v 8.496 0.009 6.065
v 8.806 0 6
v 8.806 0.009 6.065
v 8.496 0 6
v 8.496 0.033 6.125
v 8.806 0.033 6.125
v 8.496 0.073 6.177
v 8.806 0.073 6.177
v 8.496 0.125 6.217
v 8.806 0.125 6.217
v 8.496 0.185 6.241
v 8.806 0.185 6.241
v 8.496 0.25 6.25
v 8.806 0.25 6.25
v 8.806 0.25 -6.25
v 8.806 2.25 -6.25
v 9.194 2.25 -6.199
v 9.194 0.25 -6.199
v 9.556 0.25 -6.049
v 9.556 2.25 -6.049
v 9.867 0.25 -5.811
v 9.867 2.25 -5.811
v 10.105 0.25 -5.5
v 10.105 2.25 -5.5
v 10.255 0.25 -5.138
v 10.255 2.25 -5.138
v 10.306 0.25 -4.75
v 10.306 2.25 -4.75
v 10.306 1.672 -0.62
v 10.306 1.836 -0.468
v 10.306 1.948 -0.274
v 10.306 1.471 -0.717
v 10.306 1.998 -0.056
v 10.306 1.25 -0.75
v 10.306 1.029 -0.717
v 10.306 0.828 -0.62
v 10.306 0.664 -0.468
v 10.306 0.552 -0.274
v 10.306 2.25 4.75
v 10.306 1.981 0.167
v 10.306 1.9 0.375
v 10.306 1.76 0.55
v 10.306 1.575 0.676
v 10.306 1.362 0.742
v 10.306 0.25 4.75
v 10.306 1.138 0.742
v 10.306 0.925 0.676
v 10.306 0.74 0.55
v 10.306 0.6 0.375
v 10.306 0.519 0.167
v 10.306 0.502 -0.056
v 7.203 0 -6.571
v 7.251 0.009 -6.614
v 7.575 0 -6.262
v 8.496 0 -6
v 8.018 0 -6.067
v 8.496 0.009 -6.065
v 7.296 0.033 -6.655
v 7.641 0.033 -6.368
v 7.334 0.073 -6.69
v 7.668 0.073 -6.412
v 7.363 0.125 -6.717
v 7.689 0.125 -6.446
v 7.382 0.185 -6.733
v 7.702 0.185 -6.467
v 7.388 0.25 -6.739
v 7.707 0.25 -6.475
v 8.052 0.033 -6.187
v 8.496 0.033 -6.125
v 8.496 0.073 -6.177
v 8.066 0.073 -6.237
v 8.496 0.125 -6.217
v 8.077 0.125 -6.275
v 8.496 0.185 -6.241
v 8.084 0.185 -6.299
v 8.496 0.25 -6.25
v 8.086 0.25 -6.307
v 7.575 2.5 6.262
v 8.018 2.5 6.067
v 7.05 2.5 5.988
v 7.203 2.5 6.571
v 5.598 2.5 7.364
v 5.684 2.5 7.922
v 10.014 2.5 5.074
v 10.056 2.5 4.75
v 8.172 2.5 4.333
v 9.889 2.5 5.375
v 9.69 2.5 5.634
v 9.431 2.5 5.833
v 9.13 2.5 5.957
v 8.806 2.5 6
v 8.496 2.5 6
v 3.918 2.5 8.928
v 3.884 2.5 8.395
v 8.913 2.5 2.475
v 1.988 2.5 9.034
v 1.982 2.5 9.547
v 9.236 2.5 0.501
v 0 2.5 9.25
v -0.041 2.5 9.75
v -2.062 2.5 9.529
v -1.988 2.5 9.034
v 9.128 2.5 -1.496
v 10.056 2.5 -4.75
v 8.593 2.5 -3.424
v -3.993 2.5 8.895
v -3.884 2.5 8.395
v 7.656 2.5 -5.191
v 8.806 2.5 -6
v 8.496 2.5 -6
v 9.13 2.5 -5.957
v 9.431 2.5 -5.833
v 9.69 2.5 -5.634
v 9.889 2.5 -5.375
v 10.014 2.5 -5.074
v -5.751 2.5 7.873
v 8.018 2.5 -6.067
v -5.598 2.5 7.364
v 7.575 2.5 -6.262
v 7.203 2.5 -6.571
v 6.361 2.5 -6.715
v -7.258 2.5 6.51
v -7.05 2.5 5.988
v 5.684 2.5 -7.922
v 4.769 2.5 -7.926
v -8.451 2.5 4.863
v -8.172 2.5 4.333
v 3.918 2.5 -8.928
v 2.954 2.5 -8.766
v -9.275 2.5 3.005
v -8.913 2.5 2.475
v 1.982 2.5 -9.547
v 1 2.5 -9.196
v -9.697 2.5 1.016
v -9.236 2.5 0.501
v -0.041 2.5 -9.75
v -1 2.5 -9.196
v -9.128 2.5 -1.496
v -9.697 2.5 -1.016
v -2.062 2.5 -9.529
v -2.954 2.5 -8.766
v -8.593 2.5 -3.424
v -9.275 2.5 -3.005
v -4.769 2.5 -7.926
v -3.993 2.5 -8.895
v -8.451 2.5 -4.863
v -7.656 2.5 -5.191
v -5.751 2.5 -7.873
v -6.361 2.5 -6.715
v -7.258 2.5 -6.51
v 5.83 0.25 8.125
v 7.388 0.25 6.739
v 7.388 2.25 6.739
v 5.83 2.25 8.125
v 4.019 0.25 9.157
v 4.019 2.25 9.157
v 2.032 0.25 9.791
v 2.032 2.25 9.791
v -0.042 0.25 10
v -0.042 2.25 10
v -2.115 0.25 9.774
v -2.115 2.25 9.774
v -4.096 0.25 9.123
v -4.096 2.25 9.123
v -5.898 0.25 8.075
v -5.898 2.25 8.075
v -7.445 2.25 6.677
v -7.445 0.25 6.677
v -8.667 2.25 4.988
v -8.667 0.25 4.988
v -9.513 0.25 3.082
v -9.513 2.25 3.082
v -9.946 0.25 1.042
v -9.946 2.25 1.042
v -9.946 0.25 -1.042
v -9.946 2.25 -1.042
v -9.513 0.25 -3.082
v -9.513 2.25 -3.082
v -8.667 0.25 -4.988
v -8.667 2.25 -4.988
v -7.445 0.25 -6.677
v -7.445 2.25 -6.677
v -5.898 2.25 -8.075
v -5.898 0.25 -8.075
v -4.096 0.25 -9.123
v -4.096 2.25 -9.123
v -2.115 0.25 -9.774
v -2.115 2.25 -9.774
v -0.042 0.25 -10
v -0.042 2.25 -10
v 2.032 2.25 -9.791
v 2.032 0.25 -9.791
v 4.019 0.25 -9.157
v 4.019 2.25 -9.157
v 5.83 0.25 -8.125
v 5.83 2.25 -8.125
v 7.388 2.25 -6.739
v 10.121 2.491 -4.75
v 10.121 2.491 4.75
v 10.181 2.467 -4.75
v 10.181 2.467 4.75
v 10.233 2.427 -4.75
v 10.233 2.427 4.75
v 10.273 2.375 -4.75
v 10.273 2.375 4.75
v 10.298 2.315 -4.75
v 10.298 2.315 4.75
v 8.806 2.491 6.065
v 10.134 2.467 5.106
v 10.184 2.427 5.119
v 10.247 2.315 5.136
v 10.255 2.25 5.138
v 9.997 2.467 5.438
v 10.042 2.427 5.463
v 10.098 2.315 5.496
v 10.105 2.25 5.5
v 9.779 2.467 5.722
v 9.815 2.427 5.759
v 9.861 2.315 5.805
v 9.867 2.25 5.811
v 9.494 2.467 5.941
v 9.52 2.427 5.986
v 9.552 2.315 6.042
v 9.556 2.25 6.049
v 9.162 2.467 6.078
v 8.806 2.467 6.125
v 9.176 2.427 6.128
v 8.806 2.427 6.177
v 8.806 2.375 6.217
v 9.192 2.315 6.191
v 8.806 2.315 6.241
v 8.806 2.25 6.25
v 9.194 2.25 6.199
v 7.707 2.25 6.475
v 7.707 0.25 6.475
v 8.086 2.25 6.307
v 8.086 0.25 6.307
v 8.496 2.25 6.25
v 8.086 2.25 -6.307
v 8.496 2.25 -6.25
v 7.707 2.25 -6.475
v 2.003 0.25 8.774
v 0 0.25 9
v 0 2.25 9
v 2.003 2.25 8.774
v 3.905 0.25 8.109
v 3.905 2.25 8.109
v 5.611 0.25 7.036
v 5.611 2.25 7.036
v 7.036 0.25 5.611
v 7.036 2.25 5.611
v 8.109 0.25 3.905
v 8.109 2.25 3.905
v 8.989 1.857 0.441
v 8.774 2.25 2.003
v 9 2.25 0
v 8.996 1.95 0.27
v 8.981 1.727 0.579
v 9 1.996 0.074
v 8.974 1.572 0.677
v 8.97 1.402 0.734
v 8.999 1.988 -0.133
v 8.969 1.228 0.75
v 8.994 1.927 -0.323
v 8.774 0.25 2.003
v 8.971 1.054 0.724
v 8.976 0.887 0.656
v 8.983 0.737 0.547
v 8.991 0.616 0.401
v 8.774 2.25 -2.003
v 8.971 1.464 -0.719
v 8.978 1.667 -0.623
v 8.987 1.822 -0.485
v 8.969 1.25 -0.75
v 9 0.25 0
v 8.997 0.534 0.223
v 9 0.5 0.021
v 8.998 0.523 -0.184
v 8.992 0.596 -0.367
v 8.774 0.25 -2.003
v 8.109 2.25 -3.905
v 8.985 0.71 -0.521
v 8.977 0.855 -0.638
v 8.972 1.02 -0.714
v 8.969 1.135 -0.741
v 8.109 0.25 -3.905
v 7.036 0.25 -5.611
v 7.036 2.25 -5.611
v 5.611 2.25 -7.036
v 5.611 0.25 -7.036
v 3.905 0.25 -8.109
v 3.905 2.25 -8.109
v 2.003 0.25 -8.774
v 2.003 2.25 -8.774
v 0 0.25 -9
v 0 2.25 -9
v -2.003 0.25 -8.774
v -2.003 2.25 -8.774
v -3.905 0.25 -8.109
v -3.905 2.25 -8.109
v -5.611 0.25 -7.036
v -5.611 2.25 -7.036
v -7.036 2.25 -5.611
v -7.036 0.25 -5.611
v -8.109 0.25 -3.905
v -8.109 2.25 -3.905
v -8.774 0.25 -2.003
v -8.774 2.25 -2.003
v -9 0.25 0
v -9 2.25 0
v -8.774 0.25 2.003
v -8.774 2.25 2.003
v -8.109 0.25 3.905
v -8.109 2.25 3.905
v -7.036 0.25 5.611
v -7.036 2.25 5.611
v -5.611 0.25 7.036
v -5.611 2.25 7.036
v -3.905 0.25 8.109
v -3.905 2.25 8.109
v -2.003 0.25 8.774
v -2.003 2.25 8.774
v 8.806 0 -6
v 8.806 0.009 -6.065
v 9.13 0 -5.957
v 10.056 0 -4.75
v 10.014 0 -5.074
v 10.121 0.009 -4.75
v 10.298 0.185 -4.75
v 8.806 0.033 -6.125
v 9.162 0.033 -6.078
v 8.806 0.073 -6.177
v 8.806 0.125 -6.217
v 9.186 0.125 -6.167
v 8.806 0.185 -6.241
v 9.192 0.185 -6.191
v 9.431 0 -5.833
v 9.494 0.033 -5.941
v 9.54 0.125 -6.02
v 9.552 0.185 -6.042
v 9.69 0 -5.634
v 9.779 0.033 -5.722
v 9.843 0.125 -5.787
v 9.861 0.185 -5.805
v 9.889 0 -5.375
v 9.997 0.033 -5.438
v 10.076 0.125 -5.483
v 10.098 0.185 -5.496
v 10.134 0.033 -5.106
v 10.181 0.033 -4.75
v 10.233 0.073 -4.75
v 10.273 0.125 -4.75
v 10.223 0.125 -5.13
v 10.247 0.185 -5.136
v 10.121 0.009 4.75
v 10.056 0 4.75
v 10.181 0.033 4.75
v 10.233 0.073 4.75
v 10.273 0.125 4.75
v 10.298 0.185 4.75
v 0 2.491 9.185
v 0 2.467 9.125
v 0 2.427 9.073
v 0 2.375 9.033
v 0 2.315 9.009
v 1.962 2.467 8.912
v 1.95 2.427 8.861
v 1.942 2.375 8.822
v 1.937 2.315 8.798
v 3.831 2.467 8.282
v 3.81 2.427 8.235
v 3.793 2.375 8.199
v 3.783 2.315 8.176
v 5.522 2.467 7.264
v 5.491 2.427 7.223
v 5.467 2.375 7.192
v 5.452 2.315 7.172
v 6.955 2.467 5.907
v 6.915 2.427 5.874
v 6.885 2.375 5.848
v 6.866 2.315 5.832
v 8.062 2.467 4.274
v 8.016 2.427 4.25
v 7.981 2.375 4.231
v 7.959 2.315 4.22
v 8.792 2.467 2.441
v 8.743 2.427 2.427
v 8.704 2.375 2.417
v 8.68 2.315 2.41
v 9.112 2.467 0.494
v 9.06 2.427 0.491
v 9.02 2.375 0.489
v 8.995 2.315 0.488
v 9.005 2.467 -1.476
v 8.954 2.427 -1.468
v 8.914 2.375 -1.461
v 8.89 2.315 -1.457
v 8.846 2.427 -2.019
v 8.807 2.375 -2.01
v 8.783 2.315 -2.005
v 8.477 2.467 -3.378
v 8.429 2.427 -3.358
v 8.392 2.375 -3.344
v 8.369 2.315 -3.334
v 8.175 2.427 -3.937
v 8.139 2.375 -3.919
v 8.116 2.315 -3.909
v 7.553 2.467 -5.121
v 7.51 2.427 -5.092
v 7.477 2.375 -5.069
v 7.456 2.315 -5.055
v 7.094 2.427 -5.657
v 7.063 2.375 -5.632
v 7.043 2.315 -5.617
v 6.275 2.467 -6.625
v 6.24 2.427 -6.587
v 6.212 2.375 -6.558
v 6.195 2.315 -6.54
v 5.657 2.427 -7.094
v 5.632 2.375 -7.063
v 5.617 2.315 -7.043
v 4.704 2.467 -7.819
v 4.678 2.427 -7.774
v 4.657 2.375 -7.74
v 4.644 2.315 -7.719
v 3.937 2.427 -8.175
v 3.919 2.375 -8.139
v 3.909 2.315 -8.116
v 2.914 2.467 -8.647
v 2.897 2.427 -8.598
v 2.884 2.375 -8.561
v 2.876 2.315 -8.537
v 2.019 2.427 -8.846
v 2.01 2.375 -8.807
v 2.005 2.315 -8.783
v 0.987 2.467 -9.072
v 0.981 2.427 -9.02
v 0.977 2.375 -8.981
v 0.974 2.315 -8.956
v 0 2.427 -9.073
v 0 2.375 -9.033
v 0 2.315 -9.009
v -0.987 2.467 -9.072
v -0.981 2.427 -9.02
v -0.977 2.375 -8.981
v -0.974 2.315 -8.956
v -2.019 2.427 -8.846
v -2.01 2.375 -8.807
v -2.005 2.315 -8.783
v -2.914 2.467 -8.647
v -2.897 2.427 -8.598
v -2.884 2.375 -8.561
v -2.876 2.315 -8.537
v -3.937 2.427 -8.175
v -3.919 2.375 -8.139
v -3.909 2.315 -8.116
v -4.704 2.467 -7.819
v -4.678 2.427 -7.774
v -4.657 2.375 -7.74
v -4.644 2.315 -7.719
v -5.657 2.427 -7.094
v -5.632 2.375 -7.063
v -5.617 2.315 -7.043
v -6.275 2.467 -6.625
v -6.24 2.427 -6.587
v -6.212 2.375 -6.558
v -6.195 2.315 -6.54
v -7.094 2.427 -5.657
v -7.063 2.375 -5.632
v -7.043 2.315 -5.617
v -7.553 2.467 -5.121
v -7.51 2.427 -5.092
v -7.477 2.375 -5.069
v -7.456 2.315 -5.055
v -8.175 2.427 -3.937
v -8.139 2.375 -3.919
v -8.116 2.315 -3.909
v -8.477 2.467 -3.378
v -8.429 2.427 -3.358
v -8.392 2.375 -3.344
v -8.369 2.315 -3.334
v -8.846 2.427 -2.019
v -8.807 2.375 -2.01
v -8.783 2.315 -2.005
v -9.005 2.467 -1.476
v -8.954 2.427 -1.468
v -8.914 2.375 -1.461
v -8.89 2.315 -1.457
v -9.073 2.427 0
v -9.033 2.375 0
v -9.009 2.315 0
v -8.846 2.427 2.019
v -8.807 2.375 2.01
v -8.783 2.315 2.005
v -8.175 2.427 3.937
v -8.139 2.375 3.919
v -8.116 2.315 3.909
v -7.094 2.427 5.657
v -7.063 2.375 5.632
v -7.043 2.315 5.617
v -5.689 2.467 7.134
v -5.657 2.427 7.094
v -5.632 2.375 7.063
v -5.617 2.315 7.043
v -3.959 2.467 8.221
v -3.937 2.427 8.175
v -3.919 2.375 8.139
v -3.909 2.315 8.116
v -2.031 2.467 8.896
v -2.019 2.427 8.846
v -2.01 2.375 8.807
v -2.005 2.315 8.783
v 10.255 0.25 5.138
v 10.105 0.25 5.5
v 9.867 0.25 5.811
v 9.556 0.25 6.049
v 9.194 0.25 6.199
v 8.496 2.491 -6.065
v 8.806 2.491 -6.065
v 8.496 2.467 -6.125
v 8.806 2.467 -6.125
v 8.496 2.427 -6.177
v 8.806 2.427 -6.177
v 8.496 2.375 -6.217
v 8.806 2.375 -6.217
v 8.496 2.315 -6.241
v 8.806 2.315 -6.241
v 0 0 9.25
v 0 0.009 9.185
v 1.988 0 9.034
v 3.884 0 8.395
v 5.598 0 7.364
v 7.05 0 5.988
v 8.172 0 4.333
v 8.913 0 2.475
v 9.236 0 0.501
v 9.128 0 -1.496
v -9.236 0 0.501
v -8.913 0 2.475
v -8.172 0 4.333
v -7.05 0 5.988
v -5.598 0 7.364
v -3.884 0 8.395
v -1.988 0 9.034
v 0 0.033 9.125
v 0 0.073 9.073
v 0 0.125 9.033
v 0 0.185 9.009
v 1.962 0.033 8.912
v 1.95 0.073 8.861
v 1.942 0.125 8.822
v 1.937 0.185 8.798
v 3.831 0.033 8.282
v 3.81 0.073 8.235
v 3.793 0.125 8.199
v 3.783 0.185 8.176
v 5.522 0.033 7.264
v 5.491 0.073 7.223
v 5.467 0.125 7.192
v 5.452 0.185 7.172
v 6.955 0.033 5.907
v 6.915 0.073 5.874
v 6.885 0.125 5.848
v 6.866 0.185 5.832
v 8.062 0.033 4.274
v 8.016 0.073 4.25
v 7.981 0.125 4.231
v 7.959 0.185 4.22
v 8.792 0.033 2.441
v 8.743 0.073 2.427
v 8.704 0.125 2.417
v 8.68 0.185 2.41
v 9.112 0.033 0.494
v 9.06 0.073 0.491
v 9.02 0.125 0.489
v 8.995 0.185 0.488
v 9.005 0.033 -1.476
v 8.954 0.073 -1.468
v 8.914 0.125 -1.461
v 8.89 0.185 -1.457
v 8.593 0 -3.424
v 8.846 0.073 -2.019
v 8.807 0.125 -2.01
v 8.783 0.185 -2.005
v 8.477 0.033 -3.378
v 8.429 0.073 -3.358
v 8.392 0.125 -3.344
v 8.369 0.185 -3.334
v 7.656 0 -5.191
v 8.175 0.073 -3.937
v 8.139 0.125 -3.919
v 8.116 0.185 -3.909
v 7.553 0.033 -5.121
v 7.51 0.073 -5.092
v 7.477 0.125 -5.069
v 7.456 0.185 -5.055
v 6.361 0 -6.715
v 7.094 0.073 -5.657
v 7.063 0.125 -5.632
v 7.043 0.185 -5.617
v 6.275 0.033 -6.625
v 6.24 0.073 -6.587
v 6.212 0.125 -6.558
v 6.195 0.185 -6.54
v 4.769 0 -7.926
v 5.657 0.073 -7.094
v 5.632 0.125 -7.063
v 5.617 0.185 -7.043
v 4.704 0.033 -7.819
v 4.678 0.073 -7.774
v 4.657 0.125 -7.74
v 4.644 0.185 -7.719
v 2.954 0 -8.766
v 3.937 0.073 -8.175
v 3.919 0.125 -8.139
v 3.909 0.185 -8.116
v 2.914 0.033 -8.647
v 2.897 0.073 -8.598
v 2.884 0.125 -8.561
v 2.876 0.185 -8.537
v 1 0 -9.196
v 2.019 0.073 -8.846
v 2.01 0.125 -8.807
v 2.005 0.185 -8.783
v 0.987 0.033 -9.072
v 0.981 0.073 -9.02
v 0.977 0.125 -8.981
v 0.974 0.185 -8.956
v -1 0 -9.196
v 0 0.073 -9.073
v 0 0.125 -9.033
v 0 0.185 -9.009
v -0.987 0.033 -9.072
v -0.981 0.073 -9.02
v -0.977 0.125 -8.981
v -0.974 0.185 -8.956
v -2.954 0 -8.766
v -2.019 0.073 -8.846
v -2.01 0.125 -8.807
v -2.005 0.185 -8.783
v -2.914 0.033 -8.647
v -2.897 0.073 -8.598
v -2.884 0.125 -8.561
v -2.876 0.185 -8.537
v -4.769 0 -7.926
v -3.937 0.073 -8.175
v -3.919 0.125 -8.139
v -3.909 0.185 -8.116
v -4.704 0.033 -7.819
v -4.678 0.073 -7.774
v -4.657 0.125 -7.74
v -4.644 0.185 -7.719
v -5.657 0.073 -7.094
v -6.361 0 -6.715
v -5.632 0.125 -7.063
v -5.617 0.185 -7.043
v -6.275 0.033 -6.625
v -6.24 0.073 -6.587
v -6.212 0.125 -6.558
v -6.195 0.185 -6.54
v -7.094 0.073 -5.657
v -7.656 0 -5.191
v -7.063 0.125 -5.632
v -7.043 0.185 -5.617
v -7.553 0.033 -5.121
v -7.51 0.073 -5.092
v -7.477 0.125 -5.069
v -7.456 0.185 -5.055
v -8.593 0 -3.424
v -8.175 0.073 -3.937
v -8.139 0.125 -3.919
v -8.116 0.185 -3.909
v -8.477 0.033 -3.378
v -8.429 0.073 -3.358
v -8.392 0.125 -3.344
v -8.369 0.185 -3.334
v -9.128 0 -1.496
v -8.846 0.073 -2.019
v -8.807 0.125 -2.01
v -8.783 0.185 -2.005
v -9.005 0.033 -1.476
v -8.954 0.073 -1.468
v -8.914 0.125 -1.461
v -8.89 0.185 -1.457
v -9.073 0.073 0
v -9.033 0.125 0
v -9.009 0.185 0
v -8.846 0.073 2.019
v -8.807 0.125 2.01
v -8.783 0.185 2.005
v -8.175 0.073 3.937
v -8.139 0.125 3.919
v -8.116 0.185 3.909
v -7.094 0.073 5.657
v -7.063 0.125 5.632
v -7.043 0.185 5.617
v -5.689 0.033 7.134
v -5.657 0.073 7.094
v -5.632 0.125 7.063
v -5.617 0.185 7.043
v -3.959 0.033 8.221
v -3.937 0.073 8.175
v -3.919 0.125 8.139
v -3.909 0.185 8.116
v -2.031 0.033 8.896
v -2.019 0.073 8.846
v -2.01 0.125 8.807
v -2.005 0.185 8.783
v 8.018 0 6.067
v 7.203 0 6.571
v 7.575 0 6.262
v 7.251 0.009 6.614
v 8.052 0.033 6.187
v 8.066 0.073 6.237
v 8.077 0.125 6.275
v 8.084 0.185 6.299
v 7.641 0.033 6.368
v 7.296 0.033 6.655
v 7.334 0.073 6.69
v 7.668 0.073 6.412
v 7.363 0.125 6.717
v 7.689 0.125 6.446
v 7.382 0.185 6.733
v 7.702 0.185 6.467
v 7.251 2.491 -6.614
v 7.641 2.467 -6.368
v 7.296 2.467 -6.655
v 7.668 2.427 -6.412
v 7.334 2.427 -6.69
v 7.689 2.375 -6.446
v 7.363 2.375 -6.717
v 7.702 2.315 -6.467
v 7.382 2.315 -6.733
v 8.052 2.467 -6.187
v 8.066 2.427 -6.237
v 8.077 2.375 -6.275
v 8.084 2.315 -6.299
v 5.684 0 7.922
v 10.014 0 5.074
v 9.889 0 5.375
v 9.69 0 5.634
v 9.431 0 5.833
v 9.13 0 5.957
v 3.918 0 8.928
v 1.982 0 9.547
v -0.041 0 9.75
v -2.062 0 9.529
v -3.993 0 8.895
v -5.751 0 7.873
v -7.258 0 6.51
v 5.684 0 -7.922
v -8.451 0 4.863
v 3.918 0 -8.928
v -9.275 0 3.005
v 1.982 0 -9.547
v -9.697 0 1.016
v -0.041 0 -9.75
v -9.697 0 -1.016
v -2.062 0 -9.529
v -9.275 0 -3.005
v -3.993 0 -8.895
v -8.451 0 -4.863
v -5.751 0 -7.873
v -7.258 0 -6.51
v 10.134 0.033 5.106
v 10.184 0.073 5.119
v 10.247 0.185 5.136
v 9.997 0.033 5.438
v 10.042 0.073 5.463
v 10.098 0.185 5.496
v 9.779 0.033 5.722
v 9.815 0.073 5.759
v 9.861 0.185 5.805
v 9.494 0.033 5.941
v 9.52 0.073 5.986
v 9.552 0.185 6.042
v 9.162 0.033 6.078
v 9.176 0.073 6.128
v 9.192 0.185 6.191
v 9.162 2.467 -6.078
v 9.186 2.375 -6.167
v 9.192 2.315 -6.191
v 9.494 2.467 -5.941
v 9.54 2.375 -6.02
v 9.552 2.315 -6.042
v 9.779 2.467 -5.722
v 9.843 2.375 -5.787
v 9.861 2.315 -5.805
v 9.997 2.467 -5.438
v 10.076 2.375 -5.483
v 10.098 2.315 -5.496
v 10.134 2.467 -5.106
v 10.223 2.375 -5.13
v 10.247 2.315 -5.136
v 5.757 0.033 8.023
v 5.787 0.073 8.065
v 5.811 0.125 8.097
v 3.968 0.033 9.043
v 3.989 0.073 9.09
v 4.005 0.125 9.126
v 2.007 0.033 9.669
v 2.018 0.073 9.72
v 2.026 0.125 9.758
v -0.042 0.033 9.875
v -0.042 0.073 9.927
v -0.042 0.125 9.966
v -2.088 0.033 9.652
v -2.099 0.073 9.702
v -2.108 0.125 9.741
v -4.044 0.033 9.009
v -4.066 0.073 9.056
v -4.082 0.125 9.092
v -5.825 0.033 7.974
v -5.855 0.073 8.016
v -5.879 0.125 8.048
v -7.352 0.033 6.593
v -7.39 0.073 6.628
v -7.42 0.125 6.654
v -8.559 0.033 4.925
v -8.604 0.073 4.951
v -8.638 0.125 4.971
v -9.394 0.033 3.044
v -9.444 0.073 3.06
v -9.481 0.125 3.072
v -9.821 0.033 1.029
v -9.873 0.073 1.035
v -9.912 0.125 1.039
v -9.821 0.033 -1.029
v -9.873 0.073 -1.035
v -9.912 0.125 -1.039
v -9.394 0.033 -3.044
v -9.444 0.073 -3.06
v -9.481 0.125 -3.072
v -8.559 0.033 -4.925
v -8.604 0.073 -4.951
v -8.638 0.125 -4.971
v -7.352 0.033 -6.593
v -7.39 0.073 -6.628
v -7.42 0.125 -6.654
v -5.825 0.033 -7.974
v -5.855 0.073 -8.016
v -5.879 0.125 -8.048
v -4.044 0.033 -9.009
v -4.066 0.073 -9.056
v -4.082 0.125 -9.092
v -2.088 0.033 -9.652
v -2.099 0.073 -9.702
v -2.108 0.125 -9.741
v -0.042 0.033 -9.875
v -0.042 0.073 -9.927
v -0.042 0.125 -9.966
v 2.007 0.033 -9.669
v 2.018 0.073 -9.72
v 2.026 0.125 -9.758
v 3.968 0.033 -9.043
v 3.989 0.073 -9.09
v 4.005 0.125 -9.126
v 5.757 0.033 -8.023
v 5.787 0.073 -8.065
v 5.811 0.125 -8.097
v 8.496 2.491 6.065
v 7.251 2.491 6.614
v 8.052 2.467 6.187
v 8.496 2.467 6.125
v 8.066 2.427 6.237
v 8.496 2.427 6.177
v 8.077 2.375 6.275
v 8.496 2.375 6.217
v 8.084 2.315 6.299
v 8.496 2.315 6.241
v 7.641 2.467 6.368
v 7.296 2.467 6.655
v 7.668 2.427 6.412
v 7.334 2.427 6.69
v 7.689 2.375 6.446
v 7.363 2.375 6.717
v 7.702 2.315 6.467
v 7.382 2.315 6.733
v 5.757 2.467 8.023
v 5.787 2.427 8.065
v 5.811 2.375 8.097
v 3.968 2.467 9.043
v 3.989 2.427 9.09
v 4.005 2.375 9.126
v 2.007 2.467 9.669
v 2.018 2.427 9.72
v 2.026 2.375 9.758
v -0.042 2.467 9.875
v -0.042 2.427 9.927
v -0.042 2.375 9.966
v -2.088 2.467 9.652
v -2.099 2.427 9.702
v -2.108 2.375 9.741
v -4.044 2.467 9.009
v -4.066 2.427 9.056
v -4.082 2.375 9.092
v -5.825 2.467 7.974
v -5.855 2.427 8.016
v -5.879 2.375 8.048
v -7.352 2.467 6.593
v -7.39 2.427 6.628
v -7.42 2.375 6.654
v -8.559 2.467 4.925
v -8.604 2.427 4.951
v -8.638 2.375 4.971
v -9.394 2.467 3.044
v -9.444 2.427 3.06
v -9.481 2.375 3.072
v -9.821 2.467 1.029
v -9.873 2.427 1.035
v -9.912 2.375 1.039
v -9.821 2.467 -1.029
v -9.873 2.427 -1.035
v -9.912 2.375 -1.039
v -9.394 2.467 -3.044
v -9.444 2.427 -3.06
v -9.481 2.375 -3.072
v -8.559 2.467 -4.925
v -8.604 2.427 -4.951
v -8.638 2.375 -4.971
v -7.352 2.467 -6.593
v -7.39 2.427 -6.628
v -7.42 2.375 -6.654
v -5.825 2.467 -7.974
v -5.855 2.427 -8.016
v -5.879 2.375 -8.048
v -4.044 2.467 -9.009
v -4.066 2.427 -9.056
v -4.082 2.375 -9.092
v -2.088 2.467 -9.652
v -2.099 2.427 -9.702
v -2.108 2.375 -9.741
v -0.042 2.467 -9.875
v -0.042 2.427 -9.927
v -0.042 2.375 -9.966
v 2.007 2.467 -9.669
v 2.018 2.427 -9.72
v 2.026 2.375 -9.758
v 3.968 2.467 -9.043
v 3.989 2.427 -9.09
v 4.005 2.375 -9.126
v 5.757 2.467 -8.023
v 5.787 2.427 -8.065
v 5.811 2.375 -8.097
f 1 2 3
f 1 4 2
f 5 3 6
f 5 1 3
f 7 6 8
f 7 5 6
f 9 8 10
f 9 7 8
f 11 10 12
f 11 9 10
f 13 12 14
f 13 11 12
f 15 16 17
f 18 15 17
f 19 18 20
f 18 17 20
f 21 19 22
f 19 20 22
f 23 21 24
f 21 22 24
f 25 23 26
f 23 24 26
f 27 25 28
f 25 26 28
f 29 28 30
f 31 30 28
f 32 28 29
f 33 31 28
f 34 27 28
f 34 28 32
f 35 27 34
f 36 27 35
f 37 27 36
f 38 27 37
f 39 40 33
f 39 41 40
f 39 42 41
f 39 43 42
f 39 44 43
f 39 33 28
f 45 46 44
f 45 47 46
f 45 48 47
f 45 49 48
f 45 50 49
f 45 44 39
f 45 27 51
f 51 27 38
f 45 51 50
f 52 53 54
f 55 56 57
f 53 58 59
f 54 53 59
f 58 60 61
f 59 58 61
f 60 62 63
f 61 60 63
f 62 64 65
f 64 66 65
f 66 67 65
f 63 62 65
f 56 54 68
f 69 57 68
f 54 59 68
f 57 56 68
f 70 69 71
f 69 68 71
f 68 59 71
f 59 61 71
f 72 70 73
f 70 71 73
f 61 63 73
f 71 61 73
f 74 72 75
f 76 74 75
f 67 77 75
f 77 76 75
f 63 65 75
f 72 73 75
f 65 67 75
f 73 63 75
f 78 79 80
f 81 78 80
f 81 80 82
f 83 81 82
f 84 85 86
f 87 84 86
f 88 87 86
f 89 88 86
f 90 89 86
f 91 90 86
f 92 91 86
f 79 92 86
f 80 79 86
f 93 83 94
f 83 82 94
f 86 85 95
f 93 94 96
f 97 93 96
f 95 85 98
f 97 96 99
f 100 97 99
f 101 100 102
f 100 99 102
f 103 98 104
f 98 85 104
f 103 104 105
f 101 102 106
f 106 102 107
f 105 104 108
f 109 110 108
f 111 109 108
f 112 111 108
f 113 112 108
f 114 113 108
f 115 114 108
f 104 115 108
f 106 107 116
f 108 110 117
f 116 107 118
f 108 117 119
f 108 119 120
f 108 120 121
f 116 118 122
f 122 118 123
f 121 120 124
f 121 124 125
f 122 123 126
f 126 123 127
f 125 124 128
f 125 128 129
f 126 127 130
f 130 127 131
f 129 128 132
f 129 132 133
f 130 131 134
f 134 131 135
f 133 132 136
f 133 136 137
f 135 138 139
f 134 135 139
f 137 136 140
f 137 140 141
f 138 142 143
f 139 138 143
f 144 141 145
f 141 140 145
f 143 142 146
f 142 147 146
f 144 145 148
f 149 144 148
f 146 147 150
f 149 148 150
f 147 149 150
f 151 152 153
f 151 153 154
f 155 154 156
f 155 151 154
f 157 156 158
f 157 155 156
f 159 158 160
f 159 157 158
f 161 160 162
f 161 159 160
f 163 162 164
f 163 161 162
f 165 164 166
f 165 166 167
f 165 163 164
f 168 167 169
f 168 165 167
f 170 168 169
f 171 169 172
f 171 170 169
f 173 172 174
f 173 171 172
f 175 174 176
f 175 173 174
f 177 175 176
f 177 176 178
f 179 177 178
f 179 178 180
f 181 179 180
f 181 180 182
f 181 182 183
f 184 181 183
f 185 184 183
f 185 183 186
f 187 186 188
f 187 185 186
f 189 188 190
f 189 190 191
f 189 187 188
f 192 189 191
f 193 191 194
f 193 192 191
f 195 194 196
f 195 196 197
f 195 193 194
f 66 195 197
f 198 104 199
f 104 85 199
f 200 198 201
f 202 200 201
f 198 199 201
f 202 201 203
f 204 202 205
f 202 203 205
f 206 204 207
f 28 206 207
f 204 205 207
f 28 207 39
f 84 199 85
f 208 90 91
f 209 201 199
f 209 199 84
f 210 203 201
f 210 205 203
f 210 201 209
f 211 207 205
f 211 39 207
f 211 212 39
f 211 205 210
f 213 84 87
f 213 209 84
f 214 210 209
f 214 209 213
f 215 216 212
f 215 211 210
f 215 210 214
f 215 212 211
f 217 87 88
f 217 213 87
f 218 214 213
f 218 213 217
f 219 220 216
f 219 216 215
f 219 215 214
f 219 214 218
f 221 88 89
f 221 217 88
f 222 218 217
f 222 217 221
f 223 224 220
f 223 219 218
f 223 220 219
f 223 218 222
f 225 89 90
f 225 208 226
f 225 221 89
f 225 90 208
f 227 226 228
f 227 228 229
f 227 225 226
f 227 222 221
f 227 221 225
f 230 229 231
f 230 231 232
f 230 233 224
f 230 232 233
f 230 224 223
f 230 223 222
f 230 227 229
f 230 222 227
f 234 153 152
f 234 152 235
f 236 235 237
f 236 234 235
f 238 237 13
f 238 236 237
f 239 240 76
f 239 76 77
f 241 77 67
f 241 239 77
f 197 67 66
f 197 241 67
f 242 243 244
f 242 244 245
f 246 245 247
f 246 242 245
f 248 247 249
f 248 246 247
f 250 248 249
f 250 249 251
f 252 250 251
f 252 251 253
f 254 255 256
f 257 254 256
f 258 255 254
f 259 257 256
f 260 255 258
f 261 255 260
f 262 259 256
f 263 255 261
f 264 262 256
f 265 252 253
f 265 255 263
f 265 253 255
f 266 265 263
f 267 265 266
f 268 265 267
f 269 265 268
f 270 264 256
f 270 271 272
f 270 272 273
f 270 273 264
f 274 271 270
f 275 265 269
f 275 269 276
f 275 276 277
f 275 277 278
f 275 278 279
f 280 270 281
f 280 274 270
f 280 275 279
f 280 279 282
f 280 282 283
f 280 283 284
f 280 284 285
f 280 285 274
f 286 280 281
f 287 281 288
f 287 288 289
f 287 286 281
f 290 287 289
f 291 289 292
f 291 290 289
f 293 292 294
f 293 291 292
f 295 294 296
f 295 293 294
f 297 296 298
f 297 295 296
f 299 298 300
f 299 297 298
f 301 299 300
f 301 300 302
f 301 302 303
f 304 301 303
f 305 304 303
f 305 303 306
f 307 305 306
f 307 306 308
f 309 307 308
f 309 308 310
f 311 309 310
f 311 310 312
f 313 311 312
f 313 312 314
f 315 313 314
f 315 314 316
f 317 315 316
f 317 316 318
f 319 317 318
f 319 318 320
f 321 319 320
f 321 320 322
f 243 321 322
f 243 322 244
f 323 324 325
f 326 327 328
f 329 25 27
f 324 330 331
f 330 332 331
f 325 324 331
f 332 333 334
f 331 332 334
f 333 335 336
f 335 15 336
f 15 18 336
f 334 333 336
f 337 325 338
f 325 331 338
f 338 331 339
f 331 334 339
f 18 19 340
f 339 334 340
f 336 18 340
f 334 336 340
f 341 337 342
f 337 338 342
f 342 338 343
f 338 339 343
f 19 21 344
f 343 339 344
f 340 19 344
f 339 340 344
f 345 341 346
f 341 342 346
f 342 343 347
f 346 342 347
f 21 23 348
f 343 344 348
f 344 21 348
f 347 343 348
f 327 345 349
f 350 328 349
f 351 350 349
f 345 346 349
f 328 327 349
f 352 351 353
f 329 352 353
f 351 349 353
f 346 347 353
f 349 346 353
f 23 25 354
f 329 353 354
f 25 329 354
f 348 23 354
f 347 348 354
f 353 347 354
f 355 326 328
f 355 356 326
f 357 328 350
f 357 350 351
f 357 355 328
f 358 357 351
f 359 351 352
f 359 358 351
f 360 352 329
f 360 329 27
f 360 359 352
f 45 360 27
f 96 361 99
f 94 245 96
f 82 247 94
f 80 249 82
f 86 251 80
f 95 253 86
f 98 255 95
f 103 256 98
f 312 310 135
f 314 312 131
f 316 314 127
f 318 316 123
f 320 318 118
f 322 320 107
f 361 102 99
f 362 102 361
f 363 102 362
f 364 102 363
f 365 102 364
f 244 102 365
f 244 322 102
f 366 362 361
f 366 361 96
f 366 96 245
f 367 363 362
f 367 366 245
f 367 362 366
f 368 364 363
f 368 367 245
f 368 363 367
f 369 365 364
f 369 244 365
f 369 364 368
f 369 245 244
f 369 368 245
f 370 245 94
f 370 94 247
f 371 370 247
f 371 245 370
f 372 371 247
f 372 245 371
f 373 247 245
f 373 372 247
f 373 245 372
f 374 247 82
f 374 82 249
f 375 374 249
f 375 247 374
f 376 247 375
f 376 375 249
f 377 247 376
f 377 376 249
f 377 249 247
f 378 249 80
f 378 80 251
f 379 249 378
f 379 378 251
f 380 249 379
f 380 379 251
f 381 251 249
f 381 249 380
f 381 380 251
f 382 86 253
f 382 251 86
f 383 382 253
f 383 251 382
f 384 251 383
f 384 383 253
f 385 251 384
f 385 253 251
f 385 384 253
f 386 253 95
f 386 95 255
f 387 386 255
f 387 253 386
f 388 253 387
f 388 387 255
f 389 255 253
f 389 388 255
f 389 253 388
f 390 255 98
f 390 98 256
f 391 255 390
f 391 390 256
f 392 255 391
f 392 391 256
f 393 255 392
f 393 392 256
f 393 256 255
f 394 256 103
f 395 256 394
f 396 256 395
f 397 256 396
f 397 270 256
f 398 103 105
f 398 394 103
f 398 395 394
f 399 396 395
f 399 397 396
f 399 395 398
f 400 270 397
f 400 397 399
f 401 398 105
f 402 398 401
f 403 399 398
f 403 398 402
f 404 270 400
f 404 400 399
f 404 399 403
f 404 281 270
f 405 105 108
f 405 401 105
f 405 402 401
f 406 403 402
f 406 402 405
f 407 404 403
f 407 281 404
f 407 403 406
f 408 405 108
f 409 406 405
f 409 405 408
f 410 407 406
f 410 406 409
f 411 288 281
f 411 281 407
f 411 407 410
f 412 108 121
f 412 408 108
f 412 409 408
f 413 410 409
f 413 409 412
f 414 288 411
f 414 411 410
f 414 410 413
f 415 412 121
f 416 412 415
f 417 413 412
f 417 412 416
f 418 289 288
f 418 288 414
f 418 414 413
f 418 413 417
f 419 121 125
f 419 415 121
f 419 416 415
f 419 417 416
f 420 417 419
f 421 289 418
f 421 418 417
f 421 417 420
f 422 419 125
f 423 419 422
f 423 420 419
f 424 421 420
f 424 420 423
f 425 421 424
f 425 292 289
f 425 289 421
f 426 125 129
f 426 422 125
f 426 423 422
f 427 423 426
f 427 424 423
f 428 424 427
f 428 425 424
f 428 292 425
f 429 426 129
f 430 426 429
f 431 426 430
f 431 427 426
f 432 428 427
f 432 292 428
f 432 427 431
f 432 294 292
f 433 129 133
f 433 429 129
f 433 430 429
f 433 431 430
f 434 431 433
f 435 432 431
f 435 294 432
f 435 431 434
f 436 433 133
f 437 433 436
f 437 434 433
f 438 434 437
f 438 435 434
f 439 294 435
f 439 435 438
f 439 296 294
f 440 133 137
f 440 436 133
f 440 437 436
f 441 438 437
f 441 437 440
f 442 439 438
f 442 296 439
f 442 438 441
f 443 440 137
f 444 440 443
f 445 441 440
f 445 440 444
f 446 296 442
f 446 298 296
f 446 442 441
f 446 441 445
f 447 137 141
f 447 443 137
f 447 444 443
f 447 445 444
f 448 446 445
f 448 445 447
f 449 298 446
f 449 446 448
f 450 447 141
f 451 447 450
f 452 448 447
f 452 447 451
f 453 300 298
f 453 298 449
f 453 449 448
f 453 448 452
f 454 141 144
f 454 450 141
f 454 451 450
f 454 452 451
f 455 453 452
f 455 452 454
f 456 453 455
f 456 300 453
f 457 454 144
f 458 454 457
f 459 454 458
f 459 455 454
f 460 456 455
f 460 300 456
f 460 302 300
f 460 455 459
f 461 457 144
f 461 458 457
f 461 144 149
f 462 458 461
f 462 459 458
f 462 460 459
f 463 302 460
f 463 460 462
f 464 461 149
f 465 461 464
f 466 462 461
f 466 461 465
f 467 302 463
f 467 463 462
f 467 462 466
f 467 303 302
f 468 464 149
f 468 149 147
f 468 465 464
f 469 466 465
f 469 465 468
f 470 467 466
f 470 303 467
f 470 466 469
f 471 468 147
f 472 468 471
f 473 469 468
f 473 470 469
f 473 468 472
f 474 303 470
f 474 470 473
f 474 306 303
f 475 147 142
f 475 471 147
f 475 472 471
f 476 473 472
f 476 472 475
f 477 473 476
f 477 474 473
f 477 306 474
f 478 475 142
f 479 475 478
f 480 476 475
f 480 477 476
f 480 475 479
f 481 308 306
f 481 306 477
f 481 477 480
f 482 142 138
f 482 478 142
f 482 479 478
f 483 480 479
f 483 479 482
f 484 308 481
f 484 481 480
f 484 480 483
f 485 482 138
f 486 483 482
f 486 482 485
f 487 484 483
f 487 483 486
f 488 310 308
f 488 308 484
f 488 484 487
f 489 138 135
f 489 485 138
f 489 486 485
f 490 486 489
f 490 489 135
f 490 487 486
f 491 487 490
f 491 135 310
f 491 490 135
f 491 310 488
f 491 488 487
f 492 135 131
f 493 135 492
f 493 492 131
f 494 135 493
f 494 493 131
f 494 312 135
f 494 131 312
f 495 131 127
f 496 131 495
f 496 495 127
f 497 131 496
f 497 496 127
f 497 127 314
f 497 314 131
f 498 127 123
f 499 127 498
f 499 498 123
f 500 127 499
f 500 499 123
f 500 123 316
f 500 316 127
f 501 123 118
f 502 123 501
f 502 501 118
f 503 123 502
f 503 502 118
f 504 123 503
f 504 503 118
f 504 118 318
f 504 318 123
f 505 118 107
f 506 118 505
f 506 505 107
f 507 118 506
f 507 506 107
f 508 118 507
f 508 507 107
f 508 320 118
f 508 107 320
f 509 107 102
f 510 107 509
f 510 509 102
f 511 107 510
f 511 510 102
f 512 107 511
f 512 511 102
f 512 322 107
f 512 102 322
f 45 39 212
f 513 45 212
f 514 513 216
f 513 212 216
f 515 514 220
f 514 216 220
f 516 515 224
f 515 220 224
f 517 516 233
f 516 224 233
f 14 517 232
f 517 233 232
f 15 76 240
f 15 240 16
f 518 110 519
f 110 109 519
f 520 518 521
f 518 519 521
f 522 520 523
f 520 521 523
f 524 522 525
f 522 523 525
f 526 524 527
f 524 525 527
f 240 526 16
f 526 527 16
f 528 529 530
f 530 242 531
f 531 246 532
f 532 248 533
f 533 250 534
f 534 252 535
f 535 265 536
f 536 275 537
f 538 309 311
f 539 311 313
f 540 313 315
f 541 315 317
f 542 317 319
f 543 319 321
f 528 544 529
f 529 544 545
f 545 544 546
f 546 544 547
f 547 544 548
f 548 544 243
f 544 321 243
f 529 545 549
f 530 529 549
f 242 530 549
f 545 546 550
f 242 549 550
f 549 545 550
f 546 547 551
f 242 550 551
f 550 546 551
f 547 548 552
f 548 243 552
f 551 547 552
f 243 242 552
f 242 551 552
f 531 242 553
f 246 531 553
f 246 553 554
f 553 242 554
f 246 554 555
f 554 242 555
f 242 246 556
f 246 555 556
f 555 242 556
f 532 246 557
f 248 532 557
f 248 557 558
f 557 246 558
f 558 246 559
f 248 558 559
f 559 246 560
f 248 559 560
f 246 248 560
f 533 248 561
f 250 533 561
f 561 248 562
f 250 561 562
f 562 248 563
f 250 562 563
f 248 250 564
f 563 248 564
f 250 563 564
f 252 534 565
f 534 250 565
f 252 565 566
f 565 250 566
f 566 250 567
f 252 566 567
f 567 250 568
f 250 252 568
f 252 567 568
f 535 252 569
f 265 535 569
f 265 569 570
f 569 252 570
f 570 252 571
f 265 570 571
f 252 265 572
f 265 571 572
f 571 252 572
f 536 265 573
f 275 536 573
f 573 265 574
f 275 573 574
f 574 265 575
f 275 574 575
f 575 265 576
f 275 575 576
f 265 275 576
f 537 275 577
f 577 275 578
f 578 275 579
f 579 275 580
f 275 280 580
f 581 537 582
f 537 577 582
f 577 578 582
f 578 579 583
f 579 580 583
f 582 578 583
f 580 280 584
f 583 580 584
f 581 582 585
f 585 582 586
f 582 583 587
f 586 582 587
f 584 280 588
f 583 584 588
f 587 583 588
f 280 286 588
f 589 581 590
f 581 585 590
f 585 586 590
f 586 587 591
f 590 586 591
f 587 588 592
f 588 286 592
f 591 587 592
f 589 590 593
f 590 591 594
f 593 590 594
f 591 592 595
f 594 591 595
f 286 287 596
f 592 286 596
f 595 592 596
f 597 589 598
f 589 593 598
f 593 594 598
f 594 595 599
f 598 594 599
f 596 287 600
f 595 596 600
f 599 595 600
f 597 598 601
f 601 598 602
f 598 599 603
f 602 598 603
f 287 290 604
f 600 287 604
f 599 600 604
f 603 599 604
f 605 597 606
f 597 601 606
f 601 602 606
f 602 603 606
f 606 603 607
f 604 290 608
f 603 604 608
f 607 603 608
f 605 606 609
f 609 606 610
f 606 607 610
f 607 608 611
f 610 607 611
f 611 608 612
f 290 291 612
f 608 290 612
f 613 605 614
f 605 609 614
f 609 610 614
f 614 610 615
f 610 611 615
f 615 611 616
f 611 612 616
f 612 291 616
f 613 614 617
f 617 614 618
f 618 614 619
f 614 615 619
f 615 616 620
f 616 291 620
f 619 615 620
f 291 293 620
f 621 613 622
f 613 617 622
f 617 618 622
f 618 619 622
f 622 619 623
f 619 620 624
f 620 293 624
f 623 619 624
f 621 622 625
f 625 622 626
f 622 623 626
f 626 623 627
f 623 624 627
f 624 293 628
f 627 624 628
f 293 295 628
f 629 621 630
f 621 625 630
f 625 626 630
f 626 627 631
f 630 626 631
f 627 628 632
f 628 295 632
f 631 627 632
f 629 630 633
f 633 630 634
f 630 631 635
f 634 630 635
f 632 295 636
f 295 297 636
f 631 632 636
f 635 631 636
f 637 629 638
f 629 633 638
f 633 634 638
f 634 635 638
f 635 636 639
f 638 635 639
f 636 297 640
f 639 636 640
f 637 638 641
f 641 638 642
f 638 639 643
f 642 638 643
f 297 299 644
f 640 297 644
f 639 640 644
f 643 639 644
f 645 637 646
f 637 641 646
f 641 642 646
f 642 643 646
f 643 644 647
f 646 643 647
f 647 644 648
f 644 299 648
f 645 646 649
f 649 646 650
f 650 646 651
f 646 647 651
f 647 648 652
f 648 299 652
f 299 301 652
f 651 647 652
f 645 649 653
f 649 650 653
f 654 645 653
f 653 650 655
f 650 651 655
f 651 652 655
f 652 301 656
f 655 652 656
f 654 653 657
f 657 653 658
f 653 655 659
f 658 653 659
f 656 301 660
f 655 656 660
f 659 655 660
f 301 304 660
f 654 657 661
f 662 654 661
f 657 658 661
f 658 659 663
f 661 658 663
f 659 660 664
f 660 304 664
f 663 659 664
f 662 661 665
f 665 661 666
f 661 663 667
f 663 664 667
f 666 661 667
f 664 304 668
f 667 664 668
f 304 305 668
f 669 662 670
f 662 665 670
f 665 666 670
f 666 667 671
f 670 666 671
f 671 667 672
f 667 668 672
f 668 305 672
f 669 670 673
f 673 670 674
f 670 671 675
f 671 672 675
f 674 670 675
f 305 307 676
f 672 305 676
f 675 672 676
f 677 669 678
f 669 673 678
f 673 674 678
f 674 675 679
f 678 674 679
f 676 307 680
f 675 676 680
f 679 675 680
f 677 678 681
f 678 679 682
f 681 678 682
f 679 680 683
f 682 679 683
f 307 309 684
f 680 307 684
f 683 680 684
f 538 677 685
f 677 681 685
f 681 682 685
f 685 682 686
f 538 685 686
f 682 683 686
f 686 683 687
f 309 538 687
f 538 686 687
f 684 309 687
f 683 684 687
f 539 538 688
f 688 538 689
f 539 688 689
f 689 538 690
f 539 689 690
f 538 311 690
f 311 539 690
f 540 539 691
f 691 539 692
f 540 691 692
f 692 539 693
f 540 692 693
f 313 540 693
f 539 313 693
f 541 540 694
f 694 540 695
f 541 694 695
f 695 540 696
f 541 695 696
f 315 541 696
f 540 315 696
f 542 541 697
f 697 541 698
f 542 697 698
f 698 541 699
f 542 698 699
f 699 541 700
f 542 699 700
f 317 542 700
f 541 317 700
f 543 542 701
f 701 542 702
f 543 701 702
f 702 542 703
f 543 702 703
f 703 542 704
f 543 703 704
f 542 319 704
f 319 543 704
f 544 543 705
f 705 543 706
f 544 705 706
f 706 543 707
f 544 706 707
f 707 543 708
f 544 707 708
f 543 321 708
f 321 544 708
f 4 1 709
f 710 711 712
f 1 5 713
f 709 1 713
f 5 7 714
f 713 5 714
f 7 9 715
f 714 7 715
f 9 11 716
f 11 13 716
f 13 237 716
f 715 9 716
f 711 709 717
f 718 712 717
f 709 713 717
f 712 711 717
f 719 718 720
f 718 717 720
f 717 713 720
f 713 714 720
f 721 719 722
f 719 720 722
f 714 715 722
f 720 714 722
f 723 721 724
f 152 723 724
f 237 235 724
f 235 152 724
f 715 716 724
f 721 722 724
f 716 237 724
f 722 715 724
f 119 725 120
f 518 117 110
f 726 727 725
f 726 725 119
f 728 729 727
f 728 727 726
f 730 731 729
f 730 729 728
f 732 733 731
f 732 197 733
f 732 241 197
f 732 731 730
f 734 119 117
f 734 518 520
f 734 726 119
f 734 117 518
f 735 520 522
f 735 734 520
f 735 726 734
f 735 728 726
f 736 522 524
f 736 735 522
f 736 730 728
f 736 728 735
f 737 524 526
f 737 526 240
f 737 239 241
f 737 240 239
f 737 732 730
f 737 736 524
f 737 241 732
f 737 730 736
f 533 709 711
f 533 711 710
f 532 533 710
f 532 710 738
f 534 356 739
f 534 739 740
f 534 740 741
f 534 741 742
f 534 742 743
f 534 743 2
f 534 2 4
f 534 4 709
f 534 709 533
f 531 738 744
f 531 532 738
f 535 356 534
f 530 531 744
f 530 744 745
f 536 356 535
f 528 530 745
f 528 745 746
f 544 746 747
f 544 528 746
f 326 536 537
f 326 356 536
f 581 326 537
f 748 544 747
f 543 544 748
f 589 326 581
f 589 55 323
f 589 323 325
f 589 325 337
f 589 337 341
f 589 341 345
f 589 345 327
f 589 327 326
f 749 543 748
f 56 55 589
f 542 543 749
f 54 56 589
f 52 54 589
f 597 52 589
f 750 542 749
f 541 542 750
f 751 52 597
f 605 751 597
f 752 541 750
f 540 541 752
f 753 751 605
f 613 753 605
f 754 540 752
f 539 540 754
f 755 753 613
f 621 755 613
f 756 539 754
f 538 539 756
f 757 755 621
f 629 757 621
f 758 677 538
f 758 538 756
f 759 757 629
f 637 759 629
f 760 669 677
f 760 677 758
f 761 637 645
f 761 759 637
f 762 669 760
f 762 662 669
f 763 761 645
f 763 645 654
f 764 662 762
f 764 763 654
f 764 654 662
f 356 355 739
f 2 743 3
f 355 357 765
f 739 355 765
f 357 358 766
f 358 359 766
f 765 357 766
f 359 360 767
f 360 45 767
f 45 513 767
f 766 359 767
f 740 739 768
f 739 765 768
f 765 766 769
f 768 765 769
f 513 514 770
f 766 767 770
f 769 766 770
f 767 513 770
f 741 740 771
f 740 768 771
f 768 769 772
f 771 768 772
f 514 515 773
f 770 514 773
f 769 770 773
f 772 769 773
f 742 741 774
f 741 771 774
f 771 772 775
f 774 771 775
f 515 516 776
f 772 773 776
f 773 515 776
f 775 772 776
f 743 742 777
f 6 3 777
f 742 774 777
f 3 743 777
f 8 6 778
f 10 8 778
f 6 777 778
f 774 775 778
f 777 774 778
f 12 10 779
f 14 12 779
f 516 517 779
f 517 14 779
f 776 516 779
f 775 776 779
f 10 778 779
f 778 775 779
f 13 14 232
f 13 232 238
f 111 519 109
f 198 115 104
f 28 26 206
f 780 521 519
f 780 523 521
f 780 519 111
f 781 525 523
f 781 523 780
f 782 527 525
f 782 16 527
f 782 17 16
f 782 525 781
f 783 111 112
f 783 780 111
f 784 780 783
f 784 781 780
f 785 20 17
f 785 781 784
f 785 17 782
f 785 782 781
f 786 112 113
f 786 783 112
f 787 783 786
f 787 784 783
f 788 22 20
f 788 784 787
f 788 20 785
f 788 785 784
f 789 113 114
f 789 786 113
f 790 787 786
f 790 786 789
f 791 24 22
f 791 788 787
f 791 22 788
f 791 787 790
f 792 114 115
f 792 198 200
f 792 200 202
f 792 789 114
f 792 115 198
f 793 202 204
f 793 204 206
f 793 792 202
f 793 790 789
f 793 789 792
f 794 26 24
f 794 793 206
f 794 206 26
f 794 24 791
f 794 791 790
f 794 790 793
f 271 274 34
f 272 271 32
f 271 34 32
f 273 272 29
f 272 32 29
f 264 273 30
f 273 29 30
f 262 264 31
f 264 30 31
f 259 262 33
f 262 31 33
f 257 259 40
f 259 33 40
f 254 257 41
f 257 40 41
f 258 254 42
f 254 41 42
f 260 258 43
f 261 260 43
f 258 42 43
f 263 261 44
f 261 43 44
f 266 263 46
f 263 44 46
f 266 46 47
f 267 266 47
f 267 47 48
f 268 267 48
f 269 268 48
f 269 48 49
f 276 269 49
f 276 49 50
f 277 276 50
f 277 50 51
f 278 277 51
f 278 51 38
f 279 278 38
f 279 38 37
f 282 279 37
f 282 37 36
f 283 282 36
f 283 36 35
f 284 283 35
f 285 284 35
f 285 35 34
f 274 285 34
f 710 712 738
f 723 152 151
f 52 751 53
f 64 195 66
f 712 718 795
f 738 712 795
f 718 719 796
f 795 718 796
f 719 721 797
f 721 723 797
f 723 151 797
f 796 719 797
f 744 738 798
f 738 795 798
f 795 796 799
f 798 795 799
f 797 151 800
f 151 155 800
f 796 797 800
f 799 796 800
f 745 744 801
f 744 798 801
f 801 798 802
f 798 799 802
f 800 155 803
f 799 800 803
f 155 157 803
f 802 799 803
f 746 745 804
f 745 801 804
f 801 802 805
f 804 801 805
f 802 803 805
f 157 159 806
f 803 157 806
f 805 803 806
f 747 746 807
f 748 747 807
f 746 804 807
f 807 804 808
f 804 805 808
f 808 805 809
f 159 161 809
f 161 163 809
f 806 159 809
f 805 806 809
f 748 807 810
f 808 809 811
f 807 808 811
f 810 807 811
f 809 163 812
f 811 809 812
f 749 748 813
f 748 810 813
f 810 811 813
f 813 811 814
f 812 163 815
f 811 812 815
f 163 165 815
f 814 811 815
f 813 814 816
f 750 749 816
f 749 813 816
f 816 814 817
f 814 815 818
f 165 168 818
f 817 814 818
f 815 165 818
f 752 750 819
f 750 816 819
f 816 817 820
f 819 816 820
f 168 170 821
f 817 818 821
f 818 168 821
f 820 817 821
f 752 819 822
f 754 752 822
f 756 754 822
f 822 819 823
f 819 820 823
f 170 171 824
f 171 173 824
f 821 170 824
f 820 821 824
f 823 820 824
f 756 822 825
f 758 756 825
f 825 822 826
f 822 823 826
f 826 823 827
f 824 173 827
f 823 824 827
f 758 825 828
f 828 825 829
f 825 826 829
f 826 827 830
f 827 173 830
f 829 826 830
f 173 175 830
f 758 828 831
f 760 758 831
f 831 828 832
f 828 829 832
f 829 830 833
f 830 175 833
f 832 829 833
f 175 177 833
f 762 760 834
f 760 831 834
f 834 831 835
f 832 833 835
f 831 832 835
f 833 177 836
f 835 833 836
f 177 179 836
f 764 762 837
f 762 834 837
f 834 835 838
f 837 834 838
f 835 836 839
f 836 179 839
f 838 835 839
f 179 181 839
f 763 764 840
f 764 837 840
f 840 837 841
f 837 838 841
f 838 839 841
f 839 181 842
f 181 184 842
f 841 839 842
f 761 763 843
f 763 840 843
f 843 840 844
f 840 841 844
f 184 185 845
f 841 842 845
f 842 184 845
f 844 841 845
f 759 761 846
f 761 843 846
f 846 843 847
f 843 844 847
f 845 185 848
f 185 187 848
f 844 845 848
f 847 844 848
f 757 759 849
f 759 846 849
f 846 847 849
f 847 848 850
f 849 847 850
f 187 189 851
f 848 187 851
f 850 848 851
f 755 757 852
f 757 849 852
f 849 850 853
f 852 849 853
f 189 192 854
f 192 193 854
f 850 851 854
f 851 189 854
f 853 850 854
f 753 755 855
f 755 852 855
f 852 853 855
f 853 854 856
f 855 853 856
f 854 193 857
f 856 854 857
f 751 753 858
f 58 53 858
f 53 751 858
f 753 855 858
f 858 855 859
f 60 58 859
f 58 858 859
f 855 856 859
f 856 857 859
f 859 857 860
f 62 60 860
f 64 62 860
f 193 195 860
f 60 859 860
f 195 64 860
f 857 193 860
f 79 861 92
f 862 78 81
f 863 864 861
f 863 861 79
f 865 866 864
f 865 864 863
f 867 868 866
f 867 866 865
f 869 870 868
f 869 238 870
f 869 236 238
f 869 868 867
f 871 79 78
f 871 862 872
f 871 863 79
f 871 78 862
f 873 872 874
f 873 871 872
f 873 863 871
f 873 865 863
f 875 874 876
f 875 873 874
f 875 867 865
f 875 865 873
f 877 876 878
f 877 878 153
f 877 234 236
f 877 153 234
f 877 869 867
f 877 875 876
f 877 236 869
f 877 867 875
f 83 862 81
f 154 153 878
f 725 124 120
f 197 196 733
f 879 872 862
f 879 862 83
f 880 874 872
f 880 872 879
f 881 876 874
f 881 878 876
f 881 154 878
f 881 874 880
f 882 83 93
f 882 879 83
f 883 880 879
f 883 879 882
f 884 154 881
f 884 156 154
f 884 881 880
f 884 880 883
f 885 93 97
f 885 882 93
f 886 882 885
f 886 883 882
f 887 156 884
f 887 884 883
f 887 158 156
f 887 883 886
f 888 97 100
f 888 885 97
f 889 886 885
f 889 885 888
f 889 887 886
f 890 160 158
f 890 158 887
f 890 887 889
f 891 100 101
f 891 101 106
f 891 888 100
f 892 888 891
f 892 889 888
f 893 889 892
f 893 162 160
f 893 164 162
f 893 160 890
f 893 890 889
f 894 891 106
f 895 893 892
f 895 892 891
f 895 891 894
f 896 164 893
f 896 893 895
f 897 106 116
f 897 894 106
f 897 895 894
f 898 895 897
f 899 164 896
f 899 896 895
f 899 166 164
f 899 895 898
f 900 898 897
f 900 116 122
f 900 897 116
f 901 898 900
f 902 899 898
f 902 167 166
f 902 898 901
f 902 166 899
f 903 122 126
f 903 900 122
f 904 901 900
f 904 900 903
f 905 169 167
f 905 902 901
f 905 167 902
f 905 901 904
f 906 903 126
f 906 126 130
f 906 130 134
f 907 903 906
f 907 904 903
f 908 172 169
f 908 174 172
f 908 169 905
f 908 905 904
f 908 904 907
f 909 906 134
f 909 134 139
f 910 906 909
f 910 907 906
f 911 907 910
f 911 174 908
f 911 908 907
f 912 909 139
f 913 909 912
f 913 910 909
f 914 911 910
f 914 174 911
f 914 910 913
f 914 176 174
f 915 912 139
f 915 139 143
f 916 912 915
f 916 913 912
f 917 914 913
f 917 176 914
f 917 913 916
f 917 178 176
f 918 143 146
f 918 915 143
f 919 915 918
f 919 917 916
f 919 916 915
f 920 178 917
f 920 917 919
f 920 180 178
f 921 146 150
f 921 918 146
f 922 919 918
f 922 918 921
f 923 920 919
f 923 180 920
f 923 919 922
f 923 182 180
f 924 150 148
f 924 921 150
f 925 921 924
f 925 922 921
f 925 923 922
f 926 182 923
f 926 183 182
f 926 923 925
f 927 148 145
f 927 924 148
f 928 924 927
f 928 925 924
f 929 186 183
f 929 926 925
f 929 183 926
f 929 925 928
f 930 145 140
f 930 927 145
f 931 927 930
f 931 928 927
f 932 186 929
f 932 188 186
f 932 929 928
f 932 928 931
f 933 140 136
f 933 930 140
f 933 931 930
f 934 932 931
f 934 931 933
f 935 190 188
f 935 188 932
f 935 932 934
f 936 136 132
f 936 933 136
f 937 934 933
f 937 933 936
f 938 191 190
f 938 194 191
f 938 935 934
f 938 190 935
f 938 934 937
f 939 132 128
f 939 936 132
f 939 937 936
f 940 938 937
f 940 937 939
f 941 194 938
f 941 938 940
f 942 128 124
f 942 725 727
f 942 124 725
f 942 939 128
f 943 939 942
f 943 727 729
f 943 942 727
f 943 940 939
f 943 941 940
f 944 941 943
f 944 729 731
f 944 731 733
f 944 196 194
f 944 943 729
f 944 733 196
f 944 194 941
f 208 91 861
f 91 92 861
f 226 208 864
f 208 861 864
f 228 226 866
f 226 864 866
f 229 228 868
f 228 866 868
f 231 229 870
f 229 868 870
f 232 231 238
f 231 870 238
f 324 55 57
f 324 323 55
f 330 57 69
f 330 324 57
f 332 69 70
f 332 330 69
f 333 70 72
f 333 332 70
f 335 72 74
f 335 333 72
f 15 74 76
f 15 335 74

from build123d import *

# Parameters (mm, degrees)
ESQUISSE1_R                  = 9
BOSS_EXTRU_1_DEPTH           = 2.5
ENL_V_MAT_EXTRU_1_REACH      = 24.773
ENL_V_MAT_EXTRU_1_END_RADIUS = 9
ESQUISSE2_R                  = 0.75
CONG_1_R                     = 1.5
CONG_2_R                     = 0.25


with BuildPart() as part:
    # Esquisse1 → Boss.-Extru.1 (new body)
    with BuildSketch(Plane(origin=(0, 0, 0), x_dir=(1, 0, 0), z_dir=(0, 1, 0))):
        with BuildLine():
            Line((7.806247498, 6.25), (10.306247498, 6.25))
            Line((10.306247498, 6.25), (10.306247498, -6.25))
            Line((10.306247498, -6.25), (7.806247498, -6.25))
            ThreePointArc((7.806247498, -6.25), (-10, 0), (7.806247498, 6.25))
        make_face()
        with Locations(Location((0, 0, 0), (0, 0, 270))):
            Circle(ESQUISSE1_R, mode=Mode.SUBTRACT)
    extrude(amount=BOSS_EXTRU_1_DEPTH)

    # Enlèv. mat.-Extru.1: up to this cylinder (the profile starts outside it)
    enl_v_mat_extru_1_end = Plane(origin=(0, 1.25, 0), z_dir=(0, -1, 0)) * Cylinder(ENL_V_MAT_EXTRU_1_END_RADIUS, 68.546, mode=Mode.PRIVATE)
    # Esquisse2 → Enlèv. mat.-Extru.1 (cut, up to the surface)
    with BuildSketch(Plane(origin=(10.306247498, 0, 0), x_dir=(0, 0, -1), z_dir=(1, 0, 0)), mode=Mode.PRIVATE) as enl_v_mat_extru_1_sk1:
        with Locations((0, 1.25)):
            Circle(ESQUISSE2_R)
    enl_v_mat_extru_1_tool1 = extrude(enl_v_mat_extru_1_sk1.sketch, amount=-ENL_V_MAT_EXTRU_1_REACH, mode=Mode.PRIVATE) - enl_v_mat_extru_1_end
    add(enl_v_mat_extru_1_tool1.solids().sort_by_distance((10.306247, 1.25, 0))[0], mode=Mode.SUBTRACT)

    # Congé1
    cong_1_edges = [part.edges().sort_by_distance(p)[0] for p in [
        (7.806247498, 1.25, -6.25),
        (10.306247498, 1.25, -6.25),
        (10.306247498, 1.25, 6.25),
        (7.806247498, 1.25, 6.25),
    ]]
    fillet(cong_1_edges, radius=CONG_1_R)

    # Congé2
    cong_2_edges = [part.edges().sort_by_distance(p)[0] for p in [
        (0, 0, -9),
        (0, 2.5, -9),
        (10.306247498, 0, 0),
        (10.306247498, 2.5, 0),
        (-10, 0, 0),
        (8.651285116, 0, -6.25),
        (8.651285116, 0, 6.25),
        (9.86690767, 0, -5.810660172),
        (9.86690767, 0, 5.810660172),
        (8.651285116, 2.5, 6.25),
        (-10, 2.5, 0),
        (8.651285116, 2.5, -6.25),
        (9.86690767, 2.5, -5.810660172),
        (9.86690767, 2.5, 5.810660172),
        (7.890643094, 0, 6.377720082),
        (7.890643094, 2.5, 6.377720082),
        (7.890643094, 0, -6.377720082),
        (7.890643094, 2.5, -6.377720082),
    ]]
    fillet(cong_2_edges, radius=CONG_2_R)


solid = part.part
